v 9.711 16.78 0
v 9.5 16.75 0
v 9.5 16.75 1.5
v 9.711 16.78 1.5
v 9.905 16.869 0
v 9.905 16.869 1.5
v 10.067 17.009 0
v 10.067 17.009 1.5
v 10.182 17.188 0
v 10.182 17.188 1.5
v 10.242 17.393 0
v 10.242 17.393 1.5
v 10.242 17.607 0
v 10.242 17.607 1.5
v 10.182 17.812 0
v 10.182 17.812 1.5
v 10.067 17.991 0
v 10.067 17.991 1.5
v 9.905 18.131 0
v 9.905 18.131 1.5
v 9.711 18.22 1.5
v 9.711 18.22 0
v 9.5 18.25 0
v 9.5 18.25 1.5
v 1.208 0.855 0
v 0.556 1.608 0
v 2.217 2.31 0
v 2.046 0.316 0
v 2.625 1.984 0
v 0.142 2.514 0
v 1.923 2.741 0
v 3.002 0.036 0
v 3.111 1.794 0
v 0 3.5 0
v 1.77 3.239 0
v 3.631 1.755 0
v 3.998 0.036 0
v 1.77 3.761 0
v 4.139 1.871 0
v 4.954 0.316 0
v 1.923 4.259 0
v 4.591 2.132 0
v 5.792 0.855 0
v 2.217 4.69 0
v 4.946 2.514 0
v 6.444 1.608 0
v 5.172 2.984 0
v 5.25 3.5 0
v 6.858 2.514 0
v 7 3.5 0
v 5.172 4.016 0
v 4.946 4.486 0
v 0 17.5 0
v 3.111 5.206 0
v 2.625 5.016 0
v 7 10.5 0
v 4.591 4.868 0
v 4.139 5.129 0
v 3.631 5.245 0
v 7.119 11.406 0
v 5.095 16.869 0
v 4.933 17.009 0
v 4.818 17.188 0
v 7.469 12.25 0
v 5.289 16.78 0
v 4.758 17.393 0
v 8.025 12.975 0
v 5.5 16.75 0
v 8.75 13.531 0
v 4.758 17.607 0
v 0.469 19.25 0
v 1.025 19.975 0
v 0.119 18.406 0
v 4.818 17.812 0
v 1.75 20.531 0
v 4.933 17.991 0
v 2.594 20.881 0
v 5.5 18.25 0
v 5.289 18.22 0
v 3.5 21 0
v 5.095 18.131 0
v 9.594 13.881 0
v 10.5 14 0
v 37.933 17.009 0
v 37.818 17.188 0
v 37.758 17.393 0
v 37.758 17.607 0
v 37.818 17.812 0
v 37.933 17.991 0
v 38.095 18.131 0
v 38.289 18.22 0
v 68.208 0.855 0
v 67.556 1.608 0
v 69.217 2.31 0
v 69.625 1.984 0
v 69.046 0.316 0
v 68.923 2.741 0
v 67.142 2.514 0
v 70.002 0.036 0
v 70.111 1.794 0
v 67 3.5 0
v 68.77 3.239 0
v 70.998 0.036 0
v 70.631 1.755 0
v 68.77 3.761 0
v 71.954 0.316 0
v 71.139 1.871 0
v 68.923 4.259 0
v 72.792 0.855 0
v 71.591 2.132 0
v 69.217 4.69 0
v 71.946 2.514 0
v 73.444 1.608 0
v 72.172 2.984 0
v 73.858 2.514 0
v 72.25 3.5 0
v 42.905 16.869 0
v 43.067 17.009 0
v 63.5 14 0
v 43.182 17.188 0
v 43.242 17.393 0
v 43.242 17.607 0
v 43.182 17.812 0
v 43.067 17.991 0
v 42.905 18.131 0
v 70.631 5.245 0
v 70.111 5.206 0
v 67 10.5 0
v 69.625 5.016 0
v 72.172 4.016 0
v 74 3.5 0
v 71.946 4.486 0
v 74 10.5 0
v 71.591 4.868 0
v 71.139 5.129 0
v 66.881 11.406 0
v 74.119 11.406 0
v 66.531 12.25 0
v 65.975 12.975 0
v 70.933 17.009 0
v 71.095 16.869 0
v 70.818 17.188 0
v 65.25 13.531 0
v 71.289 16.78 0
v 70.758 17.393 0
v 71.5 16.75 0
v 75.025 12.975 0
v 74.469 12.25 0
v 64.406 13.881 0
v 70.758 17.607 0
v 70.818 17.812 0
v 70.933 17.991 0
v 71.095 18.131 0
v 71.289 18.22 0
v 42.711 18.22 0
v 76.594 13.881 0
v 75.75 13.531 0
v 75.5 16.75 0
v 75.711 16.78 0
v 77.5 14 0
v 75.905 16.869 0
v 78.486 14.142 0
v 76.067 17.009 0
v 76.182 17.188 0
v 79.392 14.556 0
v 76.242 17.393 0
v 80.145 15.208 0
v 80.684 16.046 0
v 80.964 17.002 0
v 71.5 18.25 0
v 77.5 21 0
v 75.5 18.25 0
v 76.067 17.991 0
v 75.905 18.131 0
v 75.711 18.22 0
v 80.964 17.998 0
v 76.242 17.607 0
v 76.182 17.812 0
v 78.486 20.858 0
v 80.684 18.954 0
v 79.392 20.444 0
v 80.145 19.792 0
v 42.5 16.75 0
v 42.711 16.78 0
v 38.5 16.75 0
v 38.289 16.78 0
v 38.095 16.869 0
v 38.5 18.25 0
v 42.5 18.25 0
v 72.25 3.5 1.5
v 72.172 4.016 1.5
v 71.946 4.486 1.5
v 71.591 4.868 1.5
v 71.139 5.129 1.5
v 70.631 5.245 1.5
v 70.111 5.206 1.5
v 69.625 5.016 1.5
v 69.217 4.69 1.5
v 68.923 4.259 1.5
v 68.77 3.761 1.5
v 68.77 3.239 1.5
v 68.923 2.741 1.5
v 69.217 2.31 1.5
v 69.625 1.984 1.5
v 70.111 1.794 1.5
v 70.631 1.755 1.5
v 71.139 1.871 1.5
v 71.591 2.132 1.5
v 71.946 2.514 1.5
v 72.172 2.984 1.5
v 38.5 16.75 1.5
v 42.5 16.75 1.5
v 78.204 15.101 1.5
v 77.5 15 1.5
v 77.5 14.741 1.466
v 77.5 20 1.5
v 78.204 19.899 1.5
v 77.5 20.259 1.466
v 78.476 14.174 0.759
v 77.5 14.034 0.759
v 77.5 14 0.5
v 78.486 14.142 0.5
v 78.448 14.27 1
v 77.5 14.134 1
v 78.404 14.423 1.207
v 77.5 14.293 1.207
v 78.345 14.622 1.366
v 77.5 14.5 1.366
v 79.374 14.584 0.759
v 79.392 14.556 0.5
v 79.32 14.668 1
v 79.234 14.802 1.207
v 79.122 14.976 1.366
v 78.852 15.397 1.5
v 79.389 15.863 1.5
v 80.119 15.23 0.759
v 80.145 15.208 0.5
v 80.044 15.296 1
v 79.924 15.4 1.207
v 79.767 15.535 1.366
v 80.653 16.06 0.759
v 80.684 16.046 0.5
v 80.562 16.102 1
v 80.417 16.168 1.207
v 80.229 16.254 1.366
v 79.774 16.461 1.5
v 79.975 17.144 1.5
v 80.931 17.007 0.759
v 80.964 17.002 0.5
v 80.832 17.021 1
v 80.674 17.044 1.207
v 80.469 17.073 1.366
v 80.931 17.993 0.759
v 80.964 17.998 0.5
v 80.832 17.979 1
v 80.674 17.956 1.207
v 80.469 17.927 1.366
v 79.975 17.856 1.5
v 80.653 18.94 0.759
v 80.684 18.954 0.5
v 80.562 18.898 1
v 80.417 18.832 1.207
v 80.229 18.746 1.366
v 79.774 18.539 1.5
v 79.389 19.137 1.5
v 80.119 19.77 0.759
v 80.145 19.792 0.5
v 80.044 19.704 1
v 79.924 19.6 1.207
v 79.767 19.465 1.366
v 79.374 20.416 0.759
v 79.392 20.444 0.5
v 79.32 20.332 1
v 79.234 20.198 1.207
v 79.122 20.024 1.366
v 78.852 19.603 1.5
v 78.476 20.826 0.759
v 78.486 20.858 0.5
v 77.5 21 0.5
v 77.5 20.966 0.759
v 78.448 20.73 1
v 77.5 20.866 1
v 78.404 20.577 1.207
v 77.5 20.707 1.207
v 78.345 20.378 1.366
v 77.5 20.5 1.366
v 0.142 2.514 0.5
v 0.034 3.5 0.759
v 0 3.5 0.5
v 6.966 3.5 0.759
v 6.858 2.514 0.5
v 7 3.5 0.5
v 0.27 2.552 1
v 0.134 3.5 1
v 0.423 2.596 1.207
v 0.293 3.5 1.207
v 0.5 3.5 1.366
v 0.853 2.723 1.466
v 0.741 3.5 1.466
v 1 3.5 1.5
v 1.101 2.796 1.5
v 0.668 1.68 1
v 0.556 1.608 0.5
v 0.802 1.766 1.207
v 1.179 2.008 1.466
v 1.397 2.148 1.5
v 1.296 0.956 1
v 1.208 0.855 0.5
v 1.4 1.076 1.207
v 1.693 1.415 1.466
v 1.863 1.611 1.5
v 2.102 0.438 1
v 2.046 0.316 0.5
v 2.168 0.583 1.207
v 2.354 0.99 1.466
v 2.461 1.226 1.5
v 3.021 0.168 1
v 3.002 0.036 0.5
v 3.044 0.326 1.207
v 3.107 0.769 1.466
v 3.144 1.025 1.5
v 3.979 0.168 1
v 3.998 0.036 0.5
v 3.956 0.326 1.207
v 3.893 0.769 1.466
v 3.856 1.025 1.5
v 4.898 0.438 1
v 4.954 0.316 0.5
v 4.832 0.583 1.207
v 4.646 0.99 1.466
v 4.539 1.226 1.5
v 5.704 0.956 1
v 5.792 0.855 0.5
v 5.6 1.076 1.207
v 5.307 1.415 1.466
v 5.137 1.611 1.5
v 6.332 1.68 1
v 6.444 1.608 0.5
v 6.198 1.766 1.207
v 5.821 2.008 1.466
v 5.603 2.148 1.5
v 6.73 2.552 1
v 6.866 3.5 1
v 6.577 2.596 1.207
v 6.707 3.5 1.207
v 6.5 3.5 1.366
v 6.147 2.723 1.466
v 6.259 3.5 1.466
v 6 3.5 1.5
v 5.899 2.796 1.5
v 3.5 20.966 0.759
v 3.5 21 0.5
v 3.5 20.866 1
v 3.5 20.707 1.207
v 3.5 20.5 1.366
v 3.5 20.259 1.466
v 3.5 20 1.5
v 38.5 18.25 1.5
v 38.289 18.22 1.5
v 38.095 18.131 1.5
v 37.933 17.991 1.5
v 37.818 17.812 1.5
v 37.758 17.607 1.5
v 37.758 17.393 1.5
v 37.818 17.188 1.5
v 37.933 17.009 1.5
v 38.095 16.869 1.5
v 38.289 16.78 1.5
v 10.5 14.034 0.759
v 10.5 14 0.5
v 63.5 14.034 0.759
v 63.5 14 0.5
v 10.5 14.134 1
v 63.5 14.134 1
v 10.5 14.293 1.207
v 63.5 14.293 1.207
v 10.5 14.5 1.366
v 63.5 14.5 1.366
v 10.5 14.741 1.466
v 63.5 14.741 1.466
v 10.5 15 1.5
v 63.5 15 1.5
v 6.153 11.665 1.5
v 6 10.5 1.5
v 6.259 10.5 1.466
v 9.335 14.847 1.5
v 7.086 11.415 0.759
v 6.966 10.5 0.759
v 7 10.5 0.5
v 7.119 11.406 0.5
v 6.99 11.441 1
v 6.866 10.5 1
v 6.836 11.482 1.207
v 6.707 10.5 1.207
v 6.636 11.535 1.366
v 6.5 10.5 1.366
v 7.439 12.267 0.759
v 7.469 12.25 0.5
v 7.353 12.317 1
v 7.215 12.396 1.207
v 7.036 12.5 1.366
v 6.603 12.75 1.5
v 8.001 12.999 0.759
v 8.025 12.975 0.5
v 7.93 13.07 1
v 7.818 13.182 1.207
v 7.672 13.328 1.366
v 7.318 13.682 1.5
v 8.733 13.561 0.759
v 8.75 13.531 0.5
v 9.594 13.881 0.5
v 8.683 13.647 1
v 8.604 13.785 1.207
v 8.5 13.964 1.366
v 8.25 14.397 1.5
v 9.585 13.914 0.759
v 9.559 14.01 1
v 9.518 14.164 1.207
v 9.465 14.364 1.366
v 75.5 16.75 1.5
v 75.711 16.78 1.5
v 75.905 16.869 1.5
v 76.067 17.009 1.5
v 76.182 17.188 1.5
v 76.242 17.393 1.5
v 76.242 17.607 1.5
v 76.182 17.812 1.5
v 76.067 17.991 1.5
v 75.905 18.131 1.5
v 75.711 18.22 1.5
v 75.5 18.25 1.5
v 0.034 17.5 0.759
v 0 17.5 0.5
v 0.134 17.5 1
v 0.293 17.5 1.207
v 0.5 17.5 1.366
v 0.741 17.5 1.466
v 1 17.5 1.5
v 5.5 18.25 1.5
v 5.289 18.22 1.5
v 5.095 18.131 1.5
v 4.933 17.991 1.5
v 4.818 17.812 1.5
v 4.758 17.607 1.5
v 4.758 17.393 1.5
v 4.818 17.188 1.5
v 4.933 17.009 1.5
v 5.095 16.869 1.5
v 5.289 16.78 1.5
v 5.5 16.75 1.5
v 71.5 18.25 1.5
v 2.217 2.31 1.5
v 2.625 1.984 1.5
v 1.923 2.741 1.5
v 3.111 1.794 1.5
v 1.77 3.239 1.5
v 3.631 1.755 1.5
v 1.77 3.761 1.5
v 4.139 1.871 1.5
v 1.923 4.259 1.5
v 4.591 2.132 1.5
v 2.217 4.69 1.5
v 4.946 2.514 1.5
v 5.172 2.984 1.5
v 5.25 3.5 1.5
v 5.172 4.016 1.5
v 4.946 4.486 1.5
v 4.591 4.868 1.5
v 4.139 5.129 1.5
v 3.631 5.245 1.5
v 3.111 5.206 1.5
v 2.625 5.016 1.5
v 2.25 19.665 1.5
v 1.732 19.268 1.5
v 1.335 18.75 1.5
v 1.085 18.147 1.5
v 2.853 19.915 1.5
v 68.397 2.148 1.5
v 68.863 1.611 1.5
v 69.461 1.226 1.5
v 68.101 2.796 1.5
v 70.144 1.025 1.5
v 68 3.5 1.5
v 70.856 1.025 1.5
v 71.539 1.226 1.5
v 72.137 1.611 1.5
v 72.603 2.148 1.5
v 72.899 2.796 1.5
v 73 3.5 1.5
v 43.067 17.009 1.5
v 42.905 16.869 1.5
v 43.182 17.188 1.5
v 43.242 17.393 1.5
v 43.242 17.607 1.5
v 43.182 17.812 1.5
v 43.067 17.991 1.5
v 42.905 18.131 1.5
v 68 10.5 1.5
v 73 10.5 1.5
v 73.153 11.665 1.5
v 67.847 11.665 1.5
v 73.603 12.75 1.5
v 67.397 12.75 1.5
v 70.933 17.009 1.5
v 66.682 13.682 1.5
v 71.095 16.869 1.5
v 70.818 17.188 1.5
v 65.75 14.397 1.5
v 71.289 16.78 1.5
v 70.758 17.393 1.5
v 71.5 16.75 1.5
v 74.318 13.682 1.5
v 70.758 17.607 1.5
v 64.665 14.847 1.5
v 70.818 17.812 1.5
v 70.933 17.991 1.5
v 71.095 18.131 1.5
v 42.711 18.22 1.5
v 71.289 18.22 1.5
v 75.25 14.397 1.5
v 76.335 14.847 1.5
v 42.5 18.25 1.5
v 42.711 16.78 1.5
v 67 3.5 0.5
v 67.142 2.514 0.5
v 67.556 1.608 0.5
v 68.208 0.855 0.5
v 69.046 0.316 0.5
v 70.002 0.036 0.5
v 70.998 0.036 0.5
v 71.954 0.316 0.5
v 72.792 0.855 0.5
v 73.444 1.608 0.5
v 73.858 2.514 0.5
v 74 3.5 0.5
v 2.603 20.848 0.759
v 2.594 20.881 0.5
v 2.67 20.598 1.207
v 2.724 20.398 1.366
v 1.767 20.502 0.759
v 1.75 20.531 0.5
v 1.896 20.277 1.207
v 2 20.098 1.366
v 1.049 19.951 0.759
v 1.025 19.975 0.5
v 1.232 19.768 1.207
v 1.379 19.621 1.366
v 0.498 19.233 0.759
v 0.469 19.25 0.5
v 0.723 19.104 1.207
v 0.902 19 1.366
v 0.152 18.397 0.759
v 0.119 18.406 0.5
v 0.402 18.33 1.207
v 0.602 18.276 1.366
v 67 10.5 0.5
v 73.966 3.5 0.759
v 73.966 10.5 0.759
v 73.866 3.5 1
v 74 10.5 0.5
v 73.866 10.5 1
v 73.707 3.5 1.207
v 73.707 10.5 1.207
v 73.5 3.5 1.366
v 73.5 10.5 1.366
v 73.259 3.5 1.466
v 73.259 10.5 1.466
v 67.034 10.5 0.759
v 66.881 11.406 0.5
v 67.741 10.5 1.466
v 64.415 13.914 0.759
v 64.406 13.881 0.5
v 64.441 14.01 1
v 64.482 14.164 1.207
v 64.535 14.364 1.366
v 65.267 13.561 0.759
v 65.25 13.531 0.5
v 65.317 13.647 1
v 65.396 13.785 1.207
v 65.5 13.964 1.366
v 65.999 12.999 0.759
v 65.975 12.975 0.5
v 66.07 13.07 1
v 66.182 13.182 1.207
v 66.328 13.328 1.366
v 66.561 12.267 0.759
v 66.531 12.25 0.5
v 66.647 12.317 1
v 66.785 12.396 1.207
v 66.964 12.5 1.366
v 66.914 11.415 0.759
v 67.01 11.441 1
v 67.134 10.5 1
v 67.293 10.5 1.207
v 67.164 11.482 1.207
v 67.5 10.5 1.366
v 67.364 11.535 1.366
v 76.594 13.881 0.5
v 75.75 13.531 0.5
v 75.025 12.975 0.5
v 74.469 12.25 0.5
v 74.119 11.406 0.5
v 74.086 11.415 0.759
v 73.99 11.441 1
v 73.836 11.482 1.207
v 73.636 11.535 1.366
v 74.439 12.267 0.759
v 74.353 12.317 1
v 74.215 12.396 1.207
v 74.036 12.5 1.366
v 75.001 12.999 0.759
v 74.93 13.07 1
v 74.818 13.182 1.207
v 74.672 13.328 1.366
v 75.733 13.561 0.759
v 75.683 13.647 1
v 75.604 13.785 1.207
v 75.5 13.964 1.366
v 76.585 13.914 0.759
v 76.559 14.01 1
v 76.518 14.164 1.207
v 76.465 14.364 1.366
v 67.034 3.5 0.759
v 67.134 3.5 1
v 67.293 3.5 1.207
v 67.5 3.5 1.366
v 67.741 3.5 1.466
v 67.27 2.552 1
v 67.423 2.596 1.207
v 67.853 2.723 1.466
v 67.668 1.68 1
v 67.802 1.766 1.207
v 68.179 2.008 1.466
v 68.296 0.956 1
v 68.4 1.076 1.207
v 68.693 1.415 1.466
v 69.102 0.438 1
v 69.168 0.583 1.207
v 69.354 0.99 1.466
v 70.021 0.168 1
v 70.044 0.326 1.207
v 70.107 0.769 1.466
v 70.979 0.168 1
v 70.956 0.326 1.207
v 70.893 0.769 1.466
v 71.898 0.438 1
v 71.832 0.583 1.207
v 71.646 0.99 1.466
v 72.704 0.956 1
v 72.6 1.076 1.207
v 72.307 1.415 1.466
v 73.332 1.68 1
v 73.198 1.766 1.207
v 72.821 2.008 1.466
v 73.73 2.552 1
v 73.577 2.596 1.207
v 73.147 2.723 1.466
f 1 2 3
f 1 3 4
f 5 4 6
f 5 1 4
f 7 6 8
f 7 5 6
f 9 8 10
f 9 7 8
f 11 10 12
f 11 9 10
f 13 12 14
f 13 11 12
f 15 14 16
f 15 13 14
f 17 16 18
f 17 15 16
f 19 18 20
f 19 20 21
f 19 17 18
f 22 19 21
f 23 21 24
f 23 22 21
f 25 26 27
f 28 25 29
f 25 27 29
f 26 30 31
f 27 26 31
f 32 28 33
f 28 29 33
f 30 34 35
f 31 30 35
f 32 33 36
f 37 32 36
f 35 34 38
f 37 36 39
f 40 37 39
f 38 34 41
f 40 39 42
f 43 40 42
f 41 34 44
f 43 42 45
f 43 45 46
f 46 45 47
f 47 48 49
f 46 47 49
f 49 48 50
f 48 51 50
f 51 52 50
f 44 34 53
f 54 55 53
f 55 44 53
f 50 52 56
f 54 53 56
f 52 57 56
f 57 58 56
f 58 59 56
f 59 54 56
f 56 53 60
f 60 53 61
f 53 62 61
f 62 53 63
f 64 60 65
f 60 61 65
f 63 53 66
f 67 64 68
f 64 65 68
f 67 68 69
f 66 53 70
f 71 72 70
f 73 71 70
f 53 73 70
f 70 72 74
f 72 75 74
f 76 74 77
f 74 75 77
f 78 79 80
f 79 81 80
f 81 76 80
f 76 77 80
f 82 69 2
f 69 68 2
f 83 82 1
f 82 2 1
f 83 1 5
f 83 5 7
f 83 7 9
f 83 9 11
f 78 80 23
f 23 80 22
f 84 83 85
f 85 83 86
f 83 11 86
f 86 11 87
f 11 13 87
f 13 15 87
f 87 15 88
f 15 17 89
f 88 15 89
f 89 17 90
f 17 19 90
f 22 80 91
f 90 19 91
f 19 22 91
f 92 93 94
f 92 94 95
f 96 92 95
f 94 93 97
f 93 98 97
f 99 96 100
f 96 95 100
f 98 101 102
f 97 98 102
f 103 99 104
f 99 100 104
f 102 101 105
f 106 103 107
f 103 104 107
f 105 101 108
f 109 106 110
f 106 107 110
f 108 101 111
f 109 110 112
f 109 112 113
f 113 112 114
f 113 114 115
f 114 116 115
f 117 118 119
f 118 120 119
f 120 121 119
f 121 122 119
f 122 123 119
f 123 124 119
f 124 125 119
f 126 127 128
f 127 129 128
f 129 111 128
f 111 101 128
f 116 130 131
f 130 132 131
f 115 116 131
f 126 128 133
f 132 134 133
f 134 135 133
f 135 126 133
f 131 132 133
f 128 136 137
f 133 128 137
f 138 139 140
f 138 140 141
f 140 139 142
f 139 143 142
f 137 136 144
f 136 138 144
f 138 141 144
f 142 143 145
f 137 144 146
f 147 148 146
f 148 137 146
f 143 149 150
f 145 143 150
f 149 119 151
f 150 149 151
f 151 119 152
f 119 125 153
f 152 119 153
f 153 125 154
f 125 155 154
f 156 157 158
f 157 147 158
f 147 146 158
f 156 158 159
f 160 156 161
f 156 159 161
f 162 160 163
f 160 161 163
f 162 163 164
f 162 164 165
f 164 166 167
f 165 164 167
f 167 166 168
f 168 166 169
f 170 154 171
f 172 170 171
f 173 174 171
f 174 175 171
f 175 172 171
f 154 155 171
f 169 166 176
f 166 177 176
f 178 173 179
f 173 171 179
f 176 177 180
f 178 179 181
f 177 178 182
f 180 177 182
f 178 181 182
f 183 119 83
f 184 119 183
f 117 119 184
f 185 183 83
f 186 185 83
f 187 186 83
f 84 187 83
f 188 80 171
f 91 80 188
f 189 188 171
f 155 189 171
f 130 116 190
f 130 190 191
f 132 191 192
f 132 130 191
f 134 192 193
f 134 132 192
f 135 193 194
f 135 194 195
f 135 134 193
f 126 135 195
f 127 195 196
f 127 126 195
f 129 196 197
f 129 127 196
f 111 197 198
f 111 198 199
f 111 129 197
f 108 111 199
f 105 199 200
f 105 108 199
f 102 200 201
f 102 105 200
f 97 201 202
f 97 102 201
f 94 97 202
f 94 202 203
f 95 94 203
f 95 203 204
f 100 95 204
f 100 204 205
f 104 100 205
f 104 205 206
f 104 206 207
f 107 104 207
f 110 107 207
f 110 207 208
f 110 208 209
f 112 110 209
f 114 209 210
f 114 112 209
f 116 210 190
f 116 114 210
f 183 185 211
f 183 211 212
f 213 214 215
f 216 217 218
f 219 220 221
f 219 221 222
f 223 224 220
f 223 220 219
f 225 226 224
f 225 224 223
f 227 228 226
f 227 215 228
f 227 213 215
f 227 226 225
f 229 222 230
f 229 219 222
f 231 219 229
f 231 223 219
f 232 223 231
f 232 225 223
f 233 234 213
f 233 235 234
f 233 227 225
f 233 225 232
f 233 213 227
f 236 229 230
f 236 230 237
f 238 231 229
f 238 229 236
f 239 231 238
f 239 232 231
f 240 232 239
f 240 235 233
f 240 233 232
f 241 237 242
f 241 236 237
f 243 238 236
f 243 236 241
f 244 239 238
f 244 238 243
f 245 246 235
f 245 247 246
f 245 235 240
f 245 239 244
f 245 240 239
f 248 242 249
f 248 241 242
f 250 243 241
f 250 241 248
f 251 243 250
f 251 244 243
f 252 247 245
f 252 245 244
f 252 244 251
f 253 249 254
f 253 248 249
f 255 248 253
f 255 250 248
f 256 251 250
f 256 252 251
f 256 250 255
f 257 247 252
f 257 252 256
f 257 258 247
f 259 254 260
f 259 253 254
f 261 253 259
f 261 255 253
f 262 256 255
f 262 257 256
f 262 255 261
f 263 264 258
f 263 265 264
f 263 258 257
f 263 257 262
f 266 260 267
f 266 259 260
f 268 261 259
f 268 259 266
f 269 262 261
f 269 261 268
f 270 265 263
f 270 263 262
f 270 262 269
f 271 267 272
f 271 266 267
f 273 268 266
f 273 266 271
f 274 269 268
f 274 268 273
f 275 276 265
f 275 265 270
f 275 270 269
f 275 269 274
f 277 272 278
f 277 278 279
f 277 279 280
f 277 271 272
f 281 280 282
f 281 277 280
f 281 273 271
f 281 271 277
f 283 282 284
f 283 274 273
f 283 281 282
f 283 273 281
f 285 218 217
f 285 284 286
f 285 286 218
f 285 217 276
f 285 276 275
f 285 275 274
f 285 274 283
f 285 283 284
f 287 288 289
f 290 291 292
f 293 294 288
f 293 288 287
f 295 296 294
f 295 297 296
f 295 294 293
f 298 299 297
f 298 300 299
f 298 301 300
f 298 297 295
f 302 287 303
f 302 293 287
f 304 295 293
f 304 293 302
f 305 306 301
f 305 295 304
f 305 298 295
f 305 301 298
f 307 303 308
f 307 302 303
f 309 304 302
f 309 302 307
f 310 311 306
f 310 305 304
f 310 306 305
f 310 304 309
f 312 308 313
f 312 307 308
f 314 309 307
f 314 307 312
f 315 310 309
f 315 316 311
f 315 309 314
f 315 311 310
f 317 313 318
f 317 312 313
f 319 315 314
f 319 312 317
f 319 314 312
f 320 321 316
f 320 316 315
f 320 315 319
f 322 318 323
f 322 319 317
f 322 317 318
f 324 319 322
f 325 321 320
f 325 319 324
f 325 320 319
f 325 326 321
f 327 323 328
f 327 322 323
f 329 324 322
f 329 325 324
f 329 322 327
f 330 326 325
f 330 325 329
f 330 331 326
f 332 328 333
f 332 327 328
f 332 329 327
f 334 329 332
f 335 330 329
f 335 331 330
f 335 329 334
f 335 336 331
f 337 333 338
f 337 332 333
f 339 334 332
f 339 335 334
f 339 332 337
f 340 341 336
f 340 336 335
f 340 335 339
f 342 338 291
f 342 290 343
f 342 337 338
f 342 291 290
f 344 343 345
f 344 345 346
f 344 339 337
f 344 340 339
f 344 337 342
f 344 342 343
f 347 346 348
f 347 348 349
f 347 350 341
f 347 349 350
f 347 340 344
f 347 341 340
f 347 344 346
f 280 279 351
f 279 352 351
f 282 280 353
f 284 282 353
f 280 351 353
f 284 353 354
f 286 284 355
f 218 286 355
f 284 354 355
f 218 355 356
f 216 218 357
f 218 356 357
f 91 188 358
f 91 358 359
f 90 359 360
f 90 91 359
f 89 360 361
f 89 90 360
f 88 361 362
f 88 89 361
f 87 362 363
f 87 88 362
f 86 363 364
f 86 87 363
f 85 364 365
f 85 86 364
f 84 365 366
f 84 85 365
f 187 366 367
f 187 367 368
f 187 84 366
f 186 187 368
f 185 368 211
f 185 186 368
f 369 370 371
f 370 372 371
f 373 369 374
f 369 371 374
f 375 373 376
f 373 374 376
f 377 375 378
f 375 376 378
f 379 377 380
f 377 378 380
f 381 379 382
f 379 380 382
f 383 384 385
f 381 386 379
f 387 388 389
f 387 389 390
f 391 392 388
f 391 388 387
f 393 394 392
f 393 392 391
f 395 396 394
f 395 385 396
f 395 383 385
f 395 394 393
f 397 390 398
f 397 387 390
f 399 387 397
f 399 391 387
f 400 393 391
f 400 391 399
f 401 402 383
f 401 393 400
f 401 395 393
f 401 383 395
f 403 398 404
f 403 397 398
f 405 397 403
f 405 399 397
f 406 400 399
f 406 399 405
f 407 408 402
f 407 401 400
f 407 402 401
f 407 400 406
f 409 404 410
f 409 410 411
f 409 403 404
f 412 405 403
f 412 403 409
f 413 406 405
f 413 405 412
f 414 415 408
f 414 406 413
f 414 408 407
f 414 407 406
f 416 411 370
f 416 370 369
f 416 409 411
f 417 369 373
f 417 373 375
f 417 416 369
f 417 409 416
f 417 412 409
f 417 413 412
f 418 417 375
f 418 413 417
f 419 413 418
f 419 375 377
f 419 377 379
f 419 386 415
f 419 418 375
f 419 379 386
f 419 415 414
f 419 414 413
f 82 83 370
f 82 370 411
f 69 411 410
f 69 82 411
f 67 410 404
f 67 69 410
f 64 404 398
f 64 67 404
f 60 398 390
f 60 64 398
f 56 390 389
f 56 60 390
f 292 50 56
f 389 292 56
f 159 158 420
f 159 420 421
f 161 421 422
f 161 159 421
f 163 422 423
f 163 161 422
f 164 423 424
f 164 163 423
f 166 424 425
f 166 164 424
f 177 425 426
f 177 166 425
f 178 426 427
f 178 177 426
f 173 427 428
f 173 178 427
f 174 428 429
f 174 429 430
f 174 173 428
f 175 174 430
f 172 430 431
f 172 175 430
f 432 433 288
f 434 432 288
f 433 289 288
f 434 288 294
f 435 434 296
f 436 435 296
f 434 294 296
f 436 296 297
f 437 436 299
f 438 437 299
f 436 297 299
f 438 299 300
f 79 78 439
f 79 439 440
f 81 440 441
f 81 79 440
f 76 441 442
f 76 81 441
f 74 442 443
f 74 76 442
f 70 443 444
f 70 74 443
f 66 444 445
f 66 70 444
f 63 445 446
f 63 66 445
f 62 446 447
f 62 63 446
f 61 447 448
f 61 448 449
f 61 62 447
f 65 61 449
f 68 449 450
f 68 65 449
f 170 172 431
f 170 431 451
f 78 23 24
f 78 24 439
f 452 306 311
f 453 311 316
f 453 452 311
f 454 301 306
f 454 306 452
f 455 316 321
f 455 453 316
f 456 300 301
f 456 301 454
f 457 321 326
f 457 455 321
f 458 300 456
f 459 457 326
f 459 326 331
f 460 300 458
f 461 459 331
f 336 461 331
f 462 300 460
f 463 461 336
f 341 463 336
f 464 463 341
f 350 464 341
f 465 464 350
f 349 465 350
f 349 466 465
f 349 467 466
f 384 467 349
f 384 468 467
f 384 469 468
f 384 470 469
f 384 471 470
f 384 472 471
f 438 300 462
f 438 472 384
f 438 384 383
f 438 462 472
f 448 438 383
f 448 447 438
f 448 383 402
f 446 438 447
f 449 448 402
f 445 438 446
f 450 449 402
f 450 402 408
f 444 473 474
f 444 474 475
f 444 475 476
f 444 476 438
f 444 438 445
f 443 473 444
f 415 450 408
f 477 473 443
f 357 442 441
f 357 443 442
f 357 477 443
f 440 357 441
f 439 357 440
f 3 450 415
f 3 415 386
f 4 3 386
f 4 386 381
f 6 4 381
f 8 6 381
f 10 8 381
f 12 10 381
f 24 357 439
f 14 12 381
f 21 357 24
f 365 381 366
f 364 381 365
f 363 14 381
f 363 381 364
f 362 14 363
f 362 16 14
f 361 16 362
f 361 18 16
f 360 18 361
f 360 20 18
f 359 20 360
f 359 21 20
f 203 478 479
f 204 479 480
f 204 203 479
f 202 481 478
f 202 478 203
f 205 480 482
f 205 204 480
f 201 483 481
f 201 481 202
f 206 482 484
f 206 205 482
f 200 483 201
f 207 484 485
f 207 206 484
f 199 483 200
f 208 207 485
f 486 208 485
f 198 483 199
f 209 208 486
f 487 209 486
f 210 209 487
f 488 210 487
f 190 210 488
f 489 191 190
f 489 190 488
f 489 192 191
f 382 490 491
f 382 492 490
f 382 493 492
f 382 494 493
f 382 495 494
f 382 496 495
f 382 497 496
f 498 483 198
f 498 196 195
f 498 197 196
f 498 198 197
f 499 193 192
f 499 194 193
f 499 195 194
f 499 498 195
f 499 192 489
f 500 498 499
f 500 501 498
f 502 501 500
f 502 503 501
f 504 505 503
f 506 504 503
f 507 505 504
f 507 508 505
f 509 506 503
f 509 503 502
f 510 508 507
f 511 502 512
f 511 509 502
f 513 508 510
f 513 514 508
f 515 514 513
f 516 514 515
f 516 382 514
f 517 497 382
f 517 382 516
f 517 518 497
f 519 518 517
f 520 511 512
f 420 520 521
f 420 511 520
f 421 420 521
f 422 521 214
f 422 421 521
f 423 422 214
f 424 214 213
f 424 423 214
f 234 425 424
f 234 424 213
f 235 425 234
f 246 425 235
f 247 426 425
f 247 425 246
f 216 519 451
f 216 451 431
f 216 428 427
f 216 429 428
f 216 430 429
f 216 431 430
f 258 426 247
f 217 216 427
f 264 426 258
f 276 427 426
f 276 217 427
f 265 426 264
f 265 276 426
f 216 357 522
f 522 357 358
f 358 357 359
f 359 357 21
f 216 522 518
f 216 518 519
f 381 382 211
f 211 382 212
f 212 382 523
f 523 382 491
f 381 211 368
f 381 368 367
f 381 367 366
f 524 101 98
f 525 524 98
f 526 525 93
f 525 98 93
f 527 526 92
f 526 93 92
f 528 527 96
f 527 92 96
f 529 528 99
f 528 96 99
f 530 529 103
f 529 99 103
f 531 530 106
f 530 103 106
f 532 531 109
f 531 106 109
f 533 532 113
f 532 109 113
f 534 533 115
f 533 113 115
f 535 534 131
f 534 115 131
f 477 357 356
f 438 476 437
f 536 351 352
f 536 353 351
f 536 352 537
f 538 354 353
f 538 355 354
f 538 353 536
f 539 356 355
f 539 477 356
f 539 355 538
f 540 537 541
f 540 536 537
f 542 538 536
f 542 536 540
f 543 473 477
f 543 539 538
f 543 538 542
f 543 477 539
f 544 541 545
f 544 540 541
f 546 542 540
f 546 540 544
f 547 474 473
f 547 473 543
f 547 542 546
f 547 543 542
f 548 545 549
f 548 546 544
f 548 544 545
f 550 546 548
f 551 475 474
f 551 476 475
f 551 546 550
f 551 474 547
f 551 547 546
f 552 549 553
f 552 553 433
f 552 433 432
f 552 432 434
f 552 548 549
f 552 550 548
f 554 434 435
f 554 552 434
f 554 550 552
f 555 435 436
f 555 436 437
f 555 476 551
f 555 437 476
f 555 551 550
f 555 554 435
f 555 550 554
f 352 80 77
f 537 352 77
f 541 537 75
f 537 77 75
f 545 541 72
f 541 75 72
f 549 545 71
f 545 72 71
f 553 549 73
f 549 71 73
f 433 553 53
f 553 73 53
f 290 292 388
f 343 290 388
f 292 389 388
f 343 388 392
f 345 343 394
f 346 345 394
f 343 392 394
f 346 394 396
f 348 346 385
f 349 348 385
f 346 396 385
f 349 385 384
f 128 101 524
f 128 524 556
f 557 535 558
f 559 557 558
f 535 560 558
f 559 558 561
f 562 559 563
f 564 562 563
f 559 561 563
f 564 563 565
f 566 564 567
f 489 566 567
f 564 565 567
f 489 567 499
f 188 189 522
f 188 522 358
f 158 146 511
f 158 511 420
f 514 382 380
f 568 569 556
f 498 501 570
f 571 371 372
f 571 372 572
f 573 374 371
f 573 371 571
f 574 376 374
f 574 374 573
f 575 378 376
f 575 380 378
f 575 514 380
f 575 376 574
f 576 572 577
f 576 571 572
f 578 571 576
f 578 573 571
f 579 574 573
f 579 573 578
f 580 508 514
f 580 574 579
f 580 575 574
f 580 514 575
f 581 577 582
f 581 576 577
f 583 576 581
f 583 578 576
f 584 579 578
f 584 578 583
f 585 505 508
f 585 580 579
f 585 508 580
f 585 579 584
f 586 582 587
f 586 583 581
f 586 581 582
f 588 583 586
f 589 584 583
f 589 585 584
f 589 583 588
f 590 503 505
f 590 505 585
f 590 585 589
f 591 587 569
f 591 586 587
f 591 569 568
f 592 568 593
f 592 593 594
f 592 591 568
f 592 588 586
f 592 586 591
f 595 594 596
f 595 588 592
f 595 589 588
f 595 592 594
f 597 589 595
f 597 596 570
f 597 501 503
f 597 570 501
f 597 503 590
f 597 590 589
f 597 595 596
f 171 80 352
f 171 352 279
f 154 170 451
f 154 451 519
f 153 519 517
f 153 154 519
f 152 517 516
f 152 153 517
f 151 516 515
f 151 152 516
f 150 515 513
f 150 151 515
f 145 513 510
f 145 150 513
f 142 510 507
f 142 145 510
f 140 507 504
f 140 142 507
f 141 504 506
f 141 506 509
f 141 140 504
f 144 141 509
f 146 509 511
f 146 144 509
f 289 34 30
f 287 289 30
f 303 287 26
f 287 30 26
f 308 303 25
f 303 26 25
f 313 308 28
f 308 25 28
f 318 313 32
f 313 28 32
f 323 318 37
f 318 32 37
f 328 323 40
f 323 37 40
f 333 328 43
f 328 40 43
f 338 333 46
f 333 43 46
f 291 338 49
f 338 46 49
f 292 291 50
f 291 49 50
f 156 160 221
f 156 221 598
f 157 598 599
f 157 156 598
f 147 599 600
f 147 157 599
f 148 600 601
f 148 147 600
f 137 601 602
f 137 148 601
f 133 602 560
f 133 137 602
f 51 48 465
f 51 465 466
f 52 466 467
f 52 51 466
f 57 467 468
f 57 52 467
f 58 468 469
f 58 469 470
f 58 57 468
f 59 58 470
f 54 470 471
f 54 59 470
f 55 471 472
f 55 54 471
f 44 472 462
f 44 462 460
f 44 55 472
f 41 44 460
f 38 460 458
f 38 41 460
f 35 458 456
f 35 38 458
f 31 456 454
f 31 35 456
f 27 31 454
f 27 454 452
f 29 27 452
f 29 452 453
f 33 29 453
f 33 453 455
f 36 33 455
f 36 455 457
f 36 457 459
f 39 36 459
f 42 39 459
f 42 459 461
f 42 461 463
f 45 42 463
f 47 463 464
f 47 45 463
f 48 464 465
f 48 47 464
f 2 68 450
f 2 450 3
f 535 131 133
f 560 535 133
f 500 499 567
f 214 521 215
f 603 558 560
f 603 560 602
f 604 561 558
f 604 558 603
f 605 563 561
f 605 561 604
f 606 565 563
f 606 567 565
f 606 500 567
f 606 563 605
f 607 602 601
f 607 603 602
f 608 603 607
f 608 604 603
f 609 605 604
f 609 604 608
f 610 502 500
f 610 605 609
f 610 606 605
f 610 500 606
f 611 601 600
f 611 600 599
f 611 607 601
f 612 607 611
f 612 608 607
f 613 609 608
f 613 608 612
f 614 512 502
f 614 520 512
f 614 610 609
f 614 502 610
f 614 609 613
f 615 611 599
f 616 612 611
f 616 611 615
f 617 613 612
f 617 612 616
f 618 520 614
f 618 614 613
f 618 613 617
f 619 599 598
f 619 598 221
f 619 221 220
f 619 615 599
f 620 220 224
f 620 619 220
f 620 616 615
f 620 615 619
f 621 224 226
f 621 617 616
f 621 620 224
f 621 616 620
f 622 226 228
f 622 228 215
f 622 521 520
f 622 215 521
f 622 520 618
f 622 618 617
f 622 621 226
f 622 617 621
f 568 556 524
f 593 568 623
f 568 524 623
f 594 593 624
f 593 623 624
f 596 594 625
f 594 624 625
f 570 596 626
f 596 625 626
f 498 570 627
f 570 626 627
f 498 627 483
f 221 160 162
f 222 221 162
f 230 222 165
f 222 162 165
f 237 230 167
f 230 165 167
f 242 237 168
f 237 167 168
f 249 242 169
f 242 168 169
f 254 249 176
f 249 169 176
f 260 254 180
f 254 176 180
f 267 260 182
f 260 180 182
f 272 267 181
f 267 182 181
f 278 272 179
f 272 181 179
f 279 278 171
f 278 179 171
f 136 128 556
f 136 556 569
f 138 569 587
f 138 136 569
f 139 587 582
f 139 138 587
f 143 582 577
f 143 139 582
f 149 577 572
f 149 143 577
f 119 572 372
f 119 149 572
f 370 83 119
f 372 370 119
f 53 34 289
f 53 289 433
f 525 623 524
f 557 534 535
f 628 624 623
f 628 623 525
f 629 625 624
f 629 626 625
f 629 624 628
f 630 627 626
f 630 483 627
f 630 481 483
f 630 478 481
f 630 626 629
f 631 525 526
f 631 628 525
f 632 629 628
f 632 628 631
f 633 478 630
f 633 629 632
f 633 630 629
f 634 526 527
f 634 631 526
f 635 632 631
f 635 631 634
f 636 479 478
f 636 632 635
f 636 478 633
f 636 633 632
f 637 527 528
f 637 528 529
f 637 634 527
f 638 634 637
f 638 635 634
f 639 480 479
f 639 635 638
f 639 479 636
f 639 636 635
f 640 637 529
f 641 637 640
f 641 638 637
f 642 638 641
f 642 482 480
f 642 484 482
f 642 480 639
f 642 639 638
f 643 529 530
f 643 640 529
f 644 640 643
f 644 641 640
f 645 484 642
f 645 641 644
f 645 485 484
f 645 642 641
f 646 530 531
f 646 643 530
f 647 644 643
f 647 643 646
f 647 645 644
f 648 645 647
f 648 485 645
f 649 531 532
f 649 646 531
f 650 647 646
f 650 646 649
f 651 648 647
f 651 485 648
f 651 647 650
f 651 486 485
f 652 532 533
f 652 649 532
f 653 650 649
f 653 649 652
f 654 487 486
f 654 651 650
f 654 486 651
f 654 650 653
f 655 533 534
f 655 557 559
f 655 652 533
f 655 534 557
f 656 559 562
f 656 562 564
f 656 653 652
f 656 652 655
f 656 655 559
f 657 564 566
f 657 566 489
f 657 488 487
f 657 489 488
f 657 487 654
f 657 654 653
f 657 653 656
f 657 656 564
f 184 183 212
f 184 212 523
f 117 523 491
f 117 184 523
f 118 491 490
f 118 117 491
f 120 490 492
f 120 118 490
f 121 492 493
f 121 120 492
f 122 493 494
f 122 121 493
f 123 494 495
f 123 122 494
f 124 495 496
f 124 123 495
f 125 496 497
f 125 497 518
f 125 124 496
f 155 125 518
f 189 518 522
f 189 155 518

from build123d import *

# Parameters (mm, degrees)
SKETCH_R  = 1.75
PAD_DEPTH = 1.5
FILLET_R  = 1


with BuildPart() as part:
    # Sketch → Pad (new body)
    with BuildSketch(Plane.XY):
        with BuildLine():
            ThreePointArc((0, 3.5), (3.5, 0), (7, 3.5))
            Line((7, 3.5), (7, 10.5))
            ThreePointArc((10.5, 14), (8.025126, 12.974874), (7, 10.5))
            Line((10.5, 14), (63.5, 14))
            ThreePointArc((67, 10.5), (65.974874, 12.974874), (63.5, 14))
            Line((67, 3.5), (67, 10.5))
            ThreePointArc((67, 3.5), (70.5, 0), (74, 3.5))
            Line((74, 3.5), (74, 10.5))
            ThreePointArc((77.5, 14), (75.025126, 12.974874), (74, 10.5))
            ThreePointArc((77.5, 14), (81, 17.5), (77.5, 21))
            Line((3.5, 21), (77.5, 21))
            ThreePointArc((3.5, 21), (1.025126, 19.974874), (0, 17.5))
            Line((0, 3.5), (0, 17.5))
        make_face()
        with Locations((3.5, 3.5)):
            Circle(SKETCH_R, mode=Mode.SUBTRACT)
        with Locations((70.5, 3.5)):
            Circle(SKETCH_R, mode=Mode.SUBTRACT)
        with BuildLine():
            ThreePointArc((5.5, 18.25), (4.75, 17.5), (5.5, 16.75))
            Line((5.5, 16.75), (9.5, 16.75))
            ThreePointArc((9.5, 16.75), (10.25, 17.5), (9.5, 18.25))
            Line((9.5, 18.25), (5.5, 18.25))
        make_face(mode=Mode.SUBTRACT)
        with BuildLine():
            ThreePointArc((38.5, 18.25), (37.75, 17.5), (38.5, 16.75))
            Line((38.5, 16.75), (42.5, 16.75))
            ThreePointArc((42.5, 16.75), (43.25, 17.5), (42.5, 18.25))
            Line((42.5, 18.25), (38.5, 18.25))
        make_face(mode=Mode.SUBTRACT)
        with BuildLine():
            ThreePointArc((71.5, 18.25), (70.75, 17.5), (71.5, 16.75))
            Line((71.5, 16.75), (75.5, 16.75))
            ThreePointArc((75.5, 16.75), (76.25, 17.5), (75.5, 18.25))
            Line((75.5, 18.25), (71.5, 18.25))
        make_face(mode=Mode.SUBTRACT)
    extrude(amount=PAD_DEPTH)

    # Fillet
    fillet_edges = [part.edges().sort_by_distance(p)[0] for p in [
        (3.5, 0, 1.5),
    ]]
    fillet(fillet_edges, radius=FILLET_R)


solid = part.part
